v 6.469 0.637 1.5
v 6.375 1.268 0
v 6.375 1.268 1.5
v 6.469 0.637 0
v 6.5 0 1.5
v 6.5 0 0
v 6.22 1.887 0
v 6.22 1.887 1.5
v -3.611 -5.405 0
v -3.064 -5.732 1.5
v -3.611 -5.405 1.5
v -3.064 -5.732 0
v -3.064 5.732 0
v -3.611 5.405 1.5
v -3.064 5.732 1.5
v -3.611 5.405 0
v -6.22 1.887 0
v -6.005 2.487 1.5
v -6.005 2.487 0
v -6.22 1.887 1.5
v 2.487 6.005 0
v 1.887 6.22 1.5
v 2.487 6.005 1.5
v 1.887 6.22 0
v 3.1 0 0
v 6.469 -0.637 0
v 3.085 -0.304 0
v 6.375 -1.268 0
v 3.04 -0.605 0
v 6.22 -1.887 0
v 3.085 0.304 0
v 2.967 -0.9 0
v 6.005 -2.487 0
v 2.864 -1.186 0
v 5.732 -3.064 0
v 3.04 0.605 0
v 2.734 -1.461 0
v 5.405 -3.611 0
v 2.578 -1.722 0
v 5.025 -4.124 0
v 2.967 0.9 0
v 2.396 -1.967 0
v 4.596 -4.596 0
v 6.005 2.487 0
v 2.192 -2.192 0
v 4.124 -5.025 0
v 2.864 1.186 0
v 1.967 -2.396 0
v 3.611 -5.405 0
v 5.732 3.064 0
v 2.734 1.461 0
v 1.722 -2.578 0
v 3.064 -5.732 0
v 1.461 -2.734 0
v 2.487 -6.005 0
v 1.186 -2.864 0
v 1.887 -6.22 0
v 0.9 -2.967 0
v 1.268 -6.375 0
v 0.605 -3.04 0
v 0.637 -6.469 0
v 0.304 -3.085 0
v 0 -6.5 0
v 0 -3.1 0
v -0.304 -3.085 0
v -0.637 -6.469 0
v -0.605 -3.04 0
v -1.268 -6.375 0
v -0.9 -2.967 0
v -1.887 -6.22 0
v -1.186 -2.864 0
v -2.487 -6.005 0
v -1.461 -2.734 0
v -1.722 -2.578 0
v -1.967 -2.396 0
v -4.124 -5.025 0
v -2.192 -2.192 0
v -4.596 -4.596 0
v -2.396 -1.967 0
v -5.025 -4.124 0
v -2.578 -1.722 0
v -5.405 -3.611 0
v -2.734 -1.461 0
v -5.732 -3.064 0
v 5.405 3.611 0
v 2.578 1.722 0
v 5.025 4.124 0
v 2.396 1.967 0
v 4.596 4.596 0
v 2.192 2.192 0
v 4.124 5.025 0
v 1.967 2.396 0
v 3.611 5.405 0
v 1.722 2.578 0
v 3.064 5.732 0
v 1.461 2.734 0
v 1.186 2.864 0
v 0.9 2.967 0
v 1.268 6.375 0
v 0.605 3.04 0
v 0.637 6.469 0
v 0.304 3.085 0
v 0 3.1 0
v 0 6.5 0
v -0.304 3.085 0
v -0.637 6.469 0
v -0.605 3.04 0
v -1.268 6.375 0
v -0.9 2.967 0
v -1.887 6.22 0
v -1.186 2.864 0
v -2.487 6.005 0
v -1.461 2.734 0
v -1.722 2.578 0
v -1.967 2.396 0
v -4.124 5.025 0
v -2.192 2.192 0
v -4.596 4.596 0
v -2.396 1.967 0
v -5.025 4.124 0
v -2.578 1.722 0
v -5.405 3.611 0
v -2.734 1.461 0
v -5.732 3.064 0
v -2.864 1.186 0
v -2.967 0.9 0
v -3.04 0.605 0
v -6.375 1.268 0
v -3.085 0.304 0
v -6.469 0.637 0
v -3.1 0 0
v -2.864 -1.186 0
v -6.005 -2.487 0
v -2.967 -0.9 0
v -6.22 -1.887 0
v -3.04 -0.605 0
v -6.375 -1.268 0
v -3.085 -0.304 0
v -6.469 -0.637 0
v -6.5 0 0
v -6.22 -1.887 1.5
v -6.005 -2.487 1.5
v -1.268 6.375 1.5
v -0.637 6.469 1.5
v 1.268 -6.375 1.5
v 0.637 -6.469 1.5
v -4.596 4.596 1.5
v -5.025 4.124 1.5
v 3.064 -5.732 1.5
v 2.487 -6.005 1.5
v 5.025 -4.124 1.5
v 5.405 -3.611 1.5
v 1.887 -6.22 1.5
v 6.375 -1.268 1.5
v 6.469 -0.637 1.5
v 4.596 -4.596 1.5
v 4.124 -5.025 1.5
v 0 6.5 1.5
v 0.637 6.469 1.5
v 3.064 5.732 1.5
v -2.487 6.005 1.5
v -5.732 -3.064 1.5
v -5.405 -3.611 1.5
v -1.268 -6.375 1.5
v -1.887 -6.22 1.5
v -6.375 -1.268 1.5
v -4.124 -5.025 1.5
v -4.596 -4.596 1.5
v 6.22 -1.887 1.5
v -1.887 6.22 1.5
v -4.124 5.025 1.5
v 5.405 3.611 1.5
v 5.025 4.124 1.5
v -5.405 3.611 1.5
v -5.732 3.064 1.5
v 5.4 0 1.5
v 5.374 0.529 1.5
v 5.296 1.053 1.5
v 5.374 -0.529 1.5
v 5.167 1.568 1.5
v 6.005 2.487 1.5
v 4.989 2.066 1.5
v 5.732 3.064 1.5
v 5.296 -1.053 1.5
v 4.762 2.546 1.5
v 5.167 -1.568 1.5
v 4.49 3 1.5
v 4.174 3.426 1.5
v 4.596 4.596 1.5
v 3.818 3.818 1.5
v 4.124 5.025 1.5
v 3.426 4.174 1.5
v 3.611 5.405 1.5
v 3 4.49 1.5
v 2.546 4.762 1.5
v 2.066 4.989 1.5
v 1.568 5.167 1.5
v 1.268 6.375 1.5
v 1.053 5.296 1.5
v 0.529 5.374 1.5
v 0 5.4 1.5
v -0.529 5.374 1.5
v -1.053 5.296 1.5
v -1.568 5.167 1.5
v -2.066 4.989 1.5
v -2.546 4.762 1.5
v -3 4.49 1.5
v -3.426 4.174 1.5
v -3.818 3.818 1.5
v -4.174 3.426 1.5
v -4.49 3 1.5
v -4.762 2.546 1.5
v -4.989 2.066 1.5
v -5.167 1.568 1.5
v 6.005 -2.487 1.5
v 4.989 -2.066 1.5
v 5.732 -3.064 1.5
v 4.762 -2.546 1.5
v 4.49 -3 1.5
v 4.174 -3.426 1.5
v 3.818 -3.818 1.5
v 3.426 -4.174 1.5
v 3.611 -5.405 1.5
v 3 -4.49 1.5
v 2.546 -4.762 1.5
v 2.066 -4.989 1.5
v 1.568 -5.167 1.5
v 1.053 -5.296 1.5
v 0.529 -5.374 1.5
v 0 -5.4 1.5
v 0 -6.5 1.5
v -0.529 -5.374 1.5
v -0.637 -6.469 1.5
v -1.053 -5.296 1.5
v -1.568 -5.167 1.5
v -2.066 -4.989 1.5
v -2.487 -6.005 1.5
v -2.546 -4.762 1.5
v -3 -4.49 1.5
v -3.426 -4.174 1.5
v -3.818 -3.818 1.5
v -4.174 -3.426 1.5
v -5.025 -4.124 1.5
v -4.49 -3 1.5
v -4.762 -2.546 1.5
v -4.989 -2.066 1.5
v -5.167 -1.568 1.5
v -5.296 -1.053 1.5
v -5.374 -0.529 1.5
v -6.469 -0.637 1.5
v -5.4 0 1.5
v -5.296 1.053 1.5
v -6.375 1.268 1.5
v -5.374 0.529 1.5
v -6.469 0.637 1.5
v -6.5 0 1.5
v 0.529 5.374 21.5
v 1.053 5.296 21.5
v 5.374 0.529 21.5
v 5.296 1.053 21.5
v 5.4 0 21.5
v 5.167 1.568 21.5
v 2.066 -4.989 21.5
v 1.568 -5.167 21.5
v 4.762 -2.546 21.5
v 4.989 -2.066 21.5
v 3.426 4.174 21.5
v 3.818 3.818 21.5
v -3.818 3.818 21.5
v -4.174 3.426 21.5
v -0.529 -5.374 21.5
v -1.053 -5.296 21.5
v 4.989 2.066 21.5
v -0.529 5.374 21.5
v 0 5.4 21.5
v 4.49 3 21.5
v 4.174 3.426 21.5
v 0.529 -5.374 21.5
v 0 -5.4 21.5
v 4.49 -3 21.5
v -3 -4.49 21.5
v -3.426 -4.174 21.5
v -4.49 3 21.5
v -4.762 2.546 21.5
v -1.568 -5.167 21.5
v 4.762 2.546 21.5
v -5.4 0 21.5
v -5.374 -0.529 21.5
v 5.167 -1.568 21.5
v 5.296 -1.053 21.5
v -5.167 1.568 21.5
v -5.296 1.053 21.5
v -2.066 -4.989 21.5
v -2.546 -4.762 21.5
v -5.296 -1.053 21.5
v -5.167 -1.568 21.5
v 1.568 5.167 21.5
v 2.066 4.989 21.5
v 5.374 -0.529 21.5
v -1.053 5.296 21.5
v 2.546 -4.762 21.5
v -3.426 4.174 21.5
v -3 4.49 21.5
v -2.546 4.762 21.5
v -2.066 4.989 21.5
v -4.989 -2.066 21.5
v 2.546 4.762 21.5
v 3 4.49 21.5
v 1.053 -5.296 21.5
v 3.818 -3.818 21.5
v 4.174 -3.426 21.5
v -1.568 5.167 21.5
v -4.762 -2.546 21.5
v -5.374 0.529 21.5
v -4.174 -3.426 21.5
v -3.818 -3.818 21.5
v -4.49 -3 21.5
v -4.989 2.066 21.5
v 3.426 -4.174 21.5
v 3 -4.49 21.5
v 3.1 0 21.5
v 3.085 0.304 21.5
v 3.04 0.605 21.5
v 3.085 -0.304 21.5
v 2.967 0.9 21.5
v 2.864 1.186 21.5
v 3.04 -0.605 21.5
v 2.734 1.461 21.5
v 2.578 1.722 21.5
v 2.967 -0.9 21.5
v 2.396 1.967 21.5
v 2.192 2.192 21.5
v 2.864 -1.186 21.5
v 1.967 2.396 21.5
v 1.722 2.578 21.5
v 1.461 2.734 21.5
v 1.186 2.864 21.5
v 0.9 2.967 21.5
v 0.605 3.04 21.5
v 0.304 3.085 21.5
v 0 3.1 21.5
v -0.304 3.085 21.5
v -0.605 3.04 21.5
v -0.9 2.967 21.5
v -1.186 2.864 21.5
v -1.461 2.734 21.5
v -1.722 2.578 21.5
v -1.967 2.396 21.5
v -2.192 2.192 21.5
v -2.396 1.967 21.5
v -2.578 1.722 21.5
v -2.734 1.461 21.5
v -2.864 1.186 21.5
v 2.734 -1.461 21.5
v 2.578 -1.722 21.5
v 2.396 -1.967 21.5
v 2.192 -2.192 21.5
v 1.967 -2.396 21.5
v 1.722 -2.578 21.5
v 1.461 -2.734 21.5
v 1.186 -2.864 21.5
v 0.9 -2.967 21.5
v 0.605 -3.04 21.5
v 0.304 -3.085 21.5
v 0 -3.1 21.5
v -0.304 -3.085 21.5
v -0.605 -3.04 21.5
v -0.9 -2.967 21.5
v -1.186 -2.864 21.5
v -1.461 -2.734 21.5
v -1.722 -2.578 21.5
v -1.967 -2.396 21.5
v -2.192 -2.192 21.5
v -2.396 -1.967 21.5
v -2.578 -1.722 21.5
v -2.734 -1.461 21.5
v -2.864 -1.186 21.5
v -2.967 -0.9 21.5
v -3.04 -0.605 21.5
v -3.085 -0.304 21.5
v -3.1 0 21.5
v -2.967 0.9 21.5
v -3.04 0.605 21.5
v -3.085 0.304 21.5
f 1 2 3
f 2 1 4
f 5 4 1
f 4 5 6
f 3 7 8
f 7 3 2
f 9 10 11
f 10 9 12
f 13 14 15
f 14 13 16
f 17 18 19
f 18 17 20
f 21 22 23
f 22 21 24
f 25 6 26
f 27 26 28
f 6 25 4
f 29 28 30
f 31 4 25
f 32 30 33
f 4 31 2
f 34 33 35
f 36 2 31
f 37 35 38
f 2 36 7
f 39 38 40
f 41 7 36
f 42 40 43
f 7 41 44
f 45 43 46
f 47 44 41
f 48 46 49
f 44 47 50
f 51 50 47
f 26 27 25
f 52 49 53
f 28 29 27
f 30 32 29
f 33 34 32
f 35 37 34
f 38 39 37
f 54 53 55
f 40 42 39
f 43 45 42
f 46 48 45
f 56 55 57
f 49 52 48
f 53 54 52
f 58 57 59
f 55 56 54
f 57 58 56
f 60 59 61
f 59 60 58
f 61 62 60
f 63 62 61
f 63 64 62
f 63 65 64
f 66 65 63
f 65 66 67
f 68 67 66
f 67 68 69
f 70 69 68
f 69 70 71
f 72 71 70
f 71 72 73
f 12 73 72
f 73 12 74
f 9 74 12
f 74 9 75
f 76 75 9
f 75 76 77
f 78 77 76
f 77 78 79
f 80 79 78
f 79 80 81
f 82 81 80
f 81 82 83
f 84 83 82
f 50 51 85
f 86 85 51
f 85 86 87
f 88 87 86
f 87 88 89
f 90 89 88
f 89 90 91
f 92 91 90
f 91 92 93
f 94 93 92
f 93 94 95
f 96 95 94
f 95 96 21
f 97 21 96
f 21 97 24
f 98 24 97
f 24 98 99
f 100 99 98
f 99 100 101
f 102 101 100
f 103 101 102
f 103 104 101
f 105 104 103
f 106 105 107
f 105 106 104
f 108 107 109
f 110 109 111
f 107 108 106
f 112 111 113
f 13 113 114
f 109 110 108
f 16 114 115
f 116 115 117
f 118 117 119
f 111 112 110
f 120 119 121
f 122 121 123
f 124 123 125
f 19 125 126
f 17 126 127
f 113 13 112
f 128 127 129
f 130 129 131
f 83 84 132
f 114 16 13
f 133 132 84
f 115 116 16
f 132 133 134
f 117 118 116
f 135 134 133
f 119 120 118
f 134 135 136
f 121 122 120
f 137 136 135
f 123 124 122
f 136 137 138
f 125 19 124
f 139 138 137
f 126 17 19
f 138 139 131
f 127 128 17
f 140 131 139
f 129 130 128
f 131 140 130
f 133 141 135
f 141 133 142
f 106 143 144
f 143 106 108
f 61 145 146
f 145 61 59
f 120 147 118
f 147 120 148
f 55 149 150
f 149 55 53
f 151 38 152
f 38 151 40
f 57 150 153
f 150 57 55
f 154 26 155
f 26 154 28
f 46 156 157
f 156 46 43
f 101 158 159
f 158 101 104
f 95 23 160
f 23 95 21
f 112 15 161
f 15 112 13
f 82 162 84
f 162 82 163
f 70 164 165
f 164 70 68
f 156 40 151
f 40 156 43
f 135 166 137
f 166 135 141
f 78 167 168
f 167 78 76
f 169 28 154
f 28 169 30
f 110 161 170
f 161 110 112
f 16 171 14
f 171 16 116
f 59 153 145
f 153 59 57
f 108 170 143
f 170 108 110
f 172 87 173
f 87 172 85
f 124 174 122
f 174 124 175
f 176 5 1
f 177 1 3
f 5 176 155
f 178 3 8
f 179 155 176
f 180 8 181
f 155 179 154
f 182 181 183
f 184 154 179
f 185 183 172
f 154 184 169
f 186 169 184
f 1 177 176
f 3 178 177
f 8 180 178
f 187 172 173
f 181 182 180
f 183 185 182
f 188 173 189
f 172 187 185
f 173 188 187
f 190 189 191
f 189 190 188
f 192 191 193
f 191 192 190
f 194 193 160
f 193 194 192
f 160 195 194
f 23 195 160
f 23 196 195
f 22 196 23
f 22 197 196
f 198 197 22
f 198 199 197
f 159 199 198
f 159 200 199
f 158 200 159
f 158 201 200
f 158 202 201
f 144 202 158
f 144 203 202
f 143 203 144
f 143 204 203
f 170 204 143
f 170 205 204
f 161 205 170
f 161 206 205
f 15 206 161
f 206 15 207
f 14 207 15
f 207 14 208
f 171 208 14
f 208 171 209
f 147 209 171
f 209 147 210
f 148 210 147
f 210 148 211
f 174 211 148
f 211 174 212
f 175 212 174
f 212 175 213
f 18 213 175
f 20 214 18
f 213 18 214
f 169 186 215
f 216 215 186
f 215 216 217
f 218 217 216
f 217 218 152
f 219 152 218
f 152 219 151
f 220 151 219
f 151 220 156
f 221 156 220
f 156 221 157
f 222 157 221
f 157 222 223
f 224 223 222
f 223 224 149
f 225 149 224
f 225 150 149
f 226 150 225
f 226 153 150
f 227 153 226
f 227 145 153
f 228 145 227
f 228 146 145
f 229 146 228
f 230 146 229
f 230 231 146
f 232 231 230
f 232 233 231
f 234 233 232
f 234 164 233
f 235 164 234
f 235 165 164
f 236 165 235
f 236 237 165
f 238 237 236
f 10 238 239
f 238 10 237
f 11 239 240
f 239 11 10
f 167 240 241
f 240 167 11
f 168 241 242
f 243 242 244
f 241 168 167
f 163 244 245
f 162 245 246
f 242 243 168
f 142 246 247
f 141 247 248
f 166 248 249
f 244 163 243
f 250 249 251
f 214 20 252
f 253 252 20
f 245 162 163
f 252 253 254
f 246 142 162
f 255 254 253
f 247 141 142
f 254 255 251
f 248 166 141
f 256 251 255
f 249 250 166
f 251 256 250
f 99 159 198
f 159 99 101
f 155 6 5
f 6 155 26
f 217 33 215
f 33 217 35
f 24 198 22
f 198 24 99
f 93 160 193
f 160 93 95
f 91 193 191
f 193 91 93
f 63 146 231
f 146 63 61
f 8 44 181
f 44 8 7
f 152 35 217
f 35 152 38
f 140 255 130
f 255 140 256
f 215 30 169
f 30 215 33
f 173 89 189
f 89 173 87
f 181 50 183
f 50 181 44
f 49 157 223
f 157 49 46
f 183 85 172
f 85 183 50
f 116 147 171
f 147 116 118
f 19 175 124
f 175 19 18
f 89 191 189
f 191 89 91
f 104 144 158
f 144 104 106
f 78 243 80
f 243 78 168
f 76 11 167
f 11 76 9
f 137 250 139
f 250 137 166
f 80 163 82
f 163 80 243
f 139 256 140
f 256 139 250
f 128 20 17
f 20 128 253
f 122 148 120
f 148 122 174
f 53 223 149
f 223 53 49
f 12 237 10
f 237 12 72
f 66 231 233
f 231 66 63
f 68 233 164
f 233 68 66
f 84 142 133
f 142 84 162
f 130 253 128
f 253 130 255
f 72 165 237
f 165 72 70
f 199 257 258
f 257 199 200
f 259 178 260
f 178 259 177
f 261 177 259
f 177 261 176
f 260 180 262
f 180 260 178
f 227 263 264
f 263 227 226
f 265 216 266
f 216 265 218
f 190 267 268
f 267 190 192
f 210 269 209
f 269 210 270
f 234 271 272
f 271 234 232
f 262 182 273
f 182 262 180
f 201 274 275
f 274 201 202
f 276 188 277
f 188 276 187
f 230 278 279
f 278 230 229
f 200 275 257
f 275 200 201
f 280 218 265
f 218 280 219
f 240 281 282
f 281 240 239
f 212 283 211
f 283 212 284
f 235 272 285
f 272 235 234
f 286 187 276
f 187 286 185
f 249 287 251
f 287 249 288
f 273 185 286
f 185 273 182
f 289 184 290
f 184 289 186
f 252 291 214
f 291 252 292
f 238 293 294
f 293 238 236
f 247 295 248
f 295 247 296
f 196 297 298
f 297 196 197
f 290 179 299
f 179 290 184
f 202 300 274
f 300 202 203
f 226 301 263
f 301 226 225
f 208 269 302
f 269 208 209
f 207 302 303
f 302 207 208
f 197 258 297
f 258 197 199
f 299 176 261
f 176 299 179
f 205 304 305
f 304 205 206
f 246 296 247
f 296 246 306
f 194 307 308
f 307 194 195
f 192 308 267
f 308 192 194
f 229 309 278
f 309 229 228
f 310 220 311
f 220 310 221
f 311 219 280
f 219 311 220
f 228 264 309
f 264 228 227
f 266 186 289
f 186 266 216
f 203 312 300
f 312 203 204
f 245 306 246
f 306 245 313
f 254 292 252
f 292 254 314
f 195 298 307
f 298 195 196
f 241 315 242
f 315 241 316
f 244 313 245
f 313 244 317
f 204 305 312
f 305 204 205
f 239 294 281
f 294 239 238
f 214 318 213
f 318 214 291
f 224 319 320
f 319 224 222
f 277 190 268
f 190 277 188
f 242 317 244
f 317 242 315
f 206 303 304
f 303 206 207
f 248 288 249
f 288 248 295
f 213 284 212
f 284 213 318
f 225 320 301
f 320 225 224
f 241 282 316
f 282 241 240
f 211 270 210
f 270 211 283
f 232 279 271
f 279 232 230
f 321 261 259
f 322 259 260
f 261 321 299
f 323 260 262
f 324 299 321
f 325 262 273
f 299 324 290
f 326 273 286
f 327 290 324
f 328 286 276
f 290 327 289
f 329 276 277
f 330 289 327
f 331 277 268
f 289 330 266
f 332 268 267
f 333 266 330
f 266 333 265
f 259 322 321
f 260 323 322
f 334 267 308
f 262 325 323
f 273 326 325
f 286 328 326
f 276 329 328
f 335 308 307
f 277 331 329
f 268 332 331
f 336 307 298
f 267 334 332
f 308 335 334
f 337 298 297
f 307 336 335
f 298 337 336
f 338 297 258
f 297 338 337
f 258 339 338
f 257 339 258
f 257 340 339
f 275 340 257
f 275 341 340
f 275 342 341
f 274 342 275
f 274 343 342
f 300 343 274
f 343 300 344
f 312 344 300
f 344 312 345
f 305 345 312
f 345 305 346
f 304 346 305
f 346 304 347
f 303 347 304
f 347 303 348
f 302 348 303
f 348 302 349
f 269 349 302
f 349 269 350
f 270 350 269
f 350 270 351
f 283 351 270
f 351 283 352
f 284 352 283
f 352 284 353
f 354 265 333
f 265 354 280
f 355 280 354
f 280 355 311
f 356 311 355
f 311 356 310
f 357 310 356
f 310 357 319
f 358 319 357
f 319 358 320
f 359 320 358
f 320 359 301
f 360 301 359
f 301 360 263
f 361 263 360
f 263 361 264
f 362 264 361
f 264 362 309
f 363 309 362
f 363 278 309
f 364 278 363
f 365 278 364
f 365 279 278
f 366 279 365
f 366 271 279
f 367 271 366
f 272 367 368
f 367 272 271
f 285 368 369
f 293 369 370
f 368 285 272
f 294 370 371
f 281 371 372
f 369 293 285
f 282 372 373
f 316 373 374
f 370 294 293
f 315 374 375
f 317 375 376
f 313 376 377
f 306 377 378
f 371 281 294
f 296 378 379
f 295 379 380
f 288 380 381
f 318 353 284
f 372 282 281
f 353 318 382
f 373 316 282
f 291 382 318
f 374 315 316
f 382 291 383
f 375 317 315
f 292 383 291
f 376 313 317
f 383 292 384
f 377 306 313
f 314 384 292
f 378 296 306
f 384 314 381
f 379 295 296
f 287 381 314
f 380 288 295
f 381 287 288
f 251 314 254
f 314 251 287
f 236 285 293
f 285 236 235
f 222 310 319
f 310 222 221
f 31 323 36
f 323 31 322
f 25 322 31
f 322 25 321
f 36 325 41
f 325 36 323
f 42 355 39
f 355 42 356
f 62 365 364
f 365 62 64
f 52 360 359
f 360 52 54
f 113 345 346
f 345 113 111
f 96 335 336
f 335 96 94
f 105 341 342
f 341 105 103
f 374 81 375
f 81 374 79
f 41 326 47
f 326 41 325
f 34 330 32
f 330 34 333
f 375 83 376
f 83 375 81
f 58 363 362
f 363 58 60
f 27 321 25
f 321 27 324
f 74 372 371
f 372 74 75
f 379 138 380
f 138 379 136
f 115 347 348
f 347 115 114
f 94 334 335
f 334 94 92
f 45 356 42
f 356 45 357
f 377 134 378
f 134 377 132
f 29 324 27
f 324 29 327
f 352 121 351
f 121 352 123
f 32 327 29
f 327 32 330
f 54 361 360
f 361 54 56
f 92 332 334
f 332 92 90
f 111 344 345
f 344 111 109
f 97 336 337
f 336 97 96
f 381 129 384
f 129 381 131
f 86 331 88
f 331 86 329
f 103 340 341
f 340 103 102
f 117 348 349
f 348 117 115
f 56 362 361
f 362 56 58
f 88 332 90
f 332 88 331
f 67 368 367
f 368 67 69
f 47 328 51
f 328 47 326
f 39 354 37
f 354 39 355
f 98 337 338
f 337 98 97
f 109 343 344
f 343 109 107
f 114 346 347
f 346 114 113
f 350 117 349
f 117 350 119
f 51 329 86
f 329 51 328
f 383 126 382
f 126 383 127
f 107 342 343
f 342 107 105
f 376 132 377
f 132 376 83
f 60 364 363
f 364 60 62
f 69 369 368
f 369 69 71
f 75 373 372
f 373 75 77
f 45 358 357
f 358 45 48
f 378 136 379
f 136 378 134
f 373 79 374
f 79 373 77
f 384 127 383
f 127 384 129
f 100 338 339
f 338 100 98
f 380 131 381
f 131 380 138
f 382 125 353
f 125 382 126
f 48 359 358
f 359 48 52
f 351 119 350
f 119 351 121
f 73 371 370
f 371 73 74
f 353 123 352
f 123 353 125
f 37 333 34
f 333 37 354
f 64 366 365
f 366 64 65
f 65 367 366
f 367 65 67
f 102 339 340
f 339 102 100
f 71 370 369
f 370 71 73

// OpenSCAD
// PCR tube adapter sleeve - fits a 0.2 mL tube into a 1.5 mL rack hole
// Print orientation: collar on bed (z = 0), sleeve body rises to z = 21.5

$fn = 64;

// --- Dimensions (mm) ---
collar_d        = 13;     // collar outer diameter
collar_h        = 1.5;    // collar thickness (z = 0 to 1.5)
sleeve_od       = 10.8;   // sleeve body outer diameter
sleeve_top_z    = 21.5;   // top of sleeve body
bore_d          = 6.2;    // through-bore diameter
eps             = 0.5;    // cutter overshoot past faces

// Derived
sleeve_h = sleeve_top_z - collar_h;  // sleeve body height (20)

difference() {
    union() {
        // Collar
        cylinder(d = collar_d, h = collar_h);
        // Sleeve body (slightly overlapping collar for a clean union)
        translate([0, 0, collar_h - 0.01])
            cylinder(d = sleeve_od, h = sleeve_h + 0.01);
    }
    // Through bore
    translate([0, 0, -eps])
        cylinder(d = bore_d, h = sleeve_top_z + 2 * eps);
}
